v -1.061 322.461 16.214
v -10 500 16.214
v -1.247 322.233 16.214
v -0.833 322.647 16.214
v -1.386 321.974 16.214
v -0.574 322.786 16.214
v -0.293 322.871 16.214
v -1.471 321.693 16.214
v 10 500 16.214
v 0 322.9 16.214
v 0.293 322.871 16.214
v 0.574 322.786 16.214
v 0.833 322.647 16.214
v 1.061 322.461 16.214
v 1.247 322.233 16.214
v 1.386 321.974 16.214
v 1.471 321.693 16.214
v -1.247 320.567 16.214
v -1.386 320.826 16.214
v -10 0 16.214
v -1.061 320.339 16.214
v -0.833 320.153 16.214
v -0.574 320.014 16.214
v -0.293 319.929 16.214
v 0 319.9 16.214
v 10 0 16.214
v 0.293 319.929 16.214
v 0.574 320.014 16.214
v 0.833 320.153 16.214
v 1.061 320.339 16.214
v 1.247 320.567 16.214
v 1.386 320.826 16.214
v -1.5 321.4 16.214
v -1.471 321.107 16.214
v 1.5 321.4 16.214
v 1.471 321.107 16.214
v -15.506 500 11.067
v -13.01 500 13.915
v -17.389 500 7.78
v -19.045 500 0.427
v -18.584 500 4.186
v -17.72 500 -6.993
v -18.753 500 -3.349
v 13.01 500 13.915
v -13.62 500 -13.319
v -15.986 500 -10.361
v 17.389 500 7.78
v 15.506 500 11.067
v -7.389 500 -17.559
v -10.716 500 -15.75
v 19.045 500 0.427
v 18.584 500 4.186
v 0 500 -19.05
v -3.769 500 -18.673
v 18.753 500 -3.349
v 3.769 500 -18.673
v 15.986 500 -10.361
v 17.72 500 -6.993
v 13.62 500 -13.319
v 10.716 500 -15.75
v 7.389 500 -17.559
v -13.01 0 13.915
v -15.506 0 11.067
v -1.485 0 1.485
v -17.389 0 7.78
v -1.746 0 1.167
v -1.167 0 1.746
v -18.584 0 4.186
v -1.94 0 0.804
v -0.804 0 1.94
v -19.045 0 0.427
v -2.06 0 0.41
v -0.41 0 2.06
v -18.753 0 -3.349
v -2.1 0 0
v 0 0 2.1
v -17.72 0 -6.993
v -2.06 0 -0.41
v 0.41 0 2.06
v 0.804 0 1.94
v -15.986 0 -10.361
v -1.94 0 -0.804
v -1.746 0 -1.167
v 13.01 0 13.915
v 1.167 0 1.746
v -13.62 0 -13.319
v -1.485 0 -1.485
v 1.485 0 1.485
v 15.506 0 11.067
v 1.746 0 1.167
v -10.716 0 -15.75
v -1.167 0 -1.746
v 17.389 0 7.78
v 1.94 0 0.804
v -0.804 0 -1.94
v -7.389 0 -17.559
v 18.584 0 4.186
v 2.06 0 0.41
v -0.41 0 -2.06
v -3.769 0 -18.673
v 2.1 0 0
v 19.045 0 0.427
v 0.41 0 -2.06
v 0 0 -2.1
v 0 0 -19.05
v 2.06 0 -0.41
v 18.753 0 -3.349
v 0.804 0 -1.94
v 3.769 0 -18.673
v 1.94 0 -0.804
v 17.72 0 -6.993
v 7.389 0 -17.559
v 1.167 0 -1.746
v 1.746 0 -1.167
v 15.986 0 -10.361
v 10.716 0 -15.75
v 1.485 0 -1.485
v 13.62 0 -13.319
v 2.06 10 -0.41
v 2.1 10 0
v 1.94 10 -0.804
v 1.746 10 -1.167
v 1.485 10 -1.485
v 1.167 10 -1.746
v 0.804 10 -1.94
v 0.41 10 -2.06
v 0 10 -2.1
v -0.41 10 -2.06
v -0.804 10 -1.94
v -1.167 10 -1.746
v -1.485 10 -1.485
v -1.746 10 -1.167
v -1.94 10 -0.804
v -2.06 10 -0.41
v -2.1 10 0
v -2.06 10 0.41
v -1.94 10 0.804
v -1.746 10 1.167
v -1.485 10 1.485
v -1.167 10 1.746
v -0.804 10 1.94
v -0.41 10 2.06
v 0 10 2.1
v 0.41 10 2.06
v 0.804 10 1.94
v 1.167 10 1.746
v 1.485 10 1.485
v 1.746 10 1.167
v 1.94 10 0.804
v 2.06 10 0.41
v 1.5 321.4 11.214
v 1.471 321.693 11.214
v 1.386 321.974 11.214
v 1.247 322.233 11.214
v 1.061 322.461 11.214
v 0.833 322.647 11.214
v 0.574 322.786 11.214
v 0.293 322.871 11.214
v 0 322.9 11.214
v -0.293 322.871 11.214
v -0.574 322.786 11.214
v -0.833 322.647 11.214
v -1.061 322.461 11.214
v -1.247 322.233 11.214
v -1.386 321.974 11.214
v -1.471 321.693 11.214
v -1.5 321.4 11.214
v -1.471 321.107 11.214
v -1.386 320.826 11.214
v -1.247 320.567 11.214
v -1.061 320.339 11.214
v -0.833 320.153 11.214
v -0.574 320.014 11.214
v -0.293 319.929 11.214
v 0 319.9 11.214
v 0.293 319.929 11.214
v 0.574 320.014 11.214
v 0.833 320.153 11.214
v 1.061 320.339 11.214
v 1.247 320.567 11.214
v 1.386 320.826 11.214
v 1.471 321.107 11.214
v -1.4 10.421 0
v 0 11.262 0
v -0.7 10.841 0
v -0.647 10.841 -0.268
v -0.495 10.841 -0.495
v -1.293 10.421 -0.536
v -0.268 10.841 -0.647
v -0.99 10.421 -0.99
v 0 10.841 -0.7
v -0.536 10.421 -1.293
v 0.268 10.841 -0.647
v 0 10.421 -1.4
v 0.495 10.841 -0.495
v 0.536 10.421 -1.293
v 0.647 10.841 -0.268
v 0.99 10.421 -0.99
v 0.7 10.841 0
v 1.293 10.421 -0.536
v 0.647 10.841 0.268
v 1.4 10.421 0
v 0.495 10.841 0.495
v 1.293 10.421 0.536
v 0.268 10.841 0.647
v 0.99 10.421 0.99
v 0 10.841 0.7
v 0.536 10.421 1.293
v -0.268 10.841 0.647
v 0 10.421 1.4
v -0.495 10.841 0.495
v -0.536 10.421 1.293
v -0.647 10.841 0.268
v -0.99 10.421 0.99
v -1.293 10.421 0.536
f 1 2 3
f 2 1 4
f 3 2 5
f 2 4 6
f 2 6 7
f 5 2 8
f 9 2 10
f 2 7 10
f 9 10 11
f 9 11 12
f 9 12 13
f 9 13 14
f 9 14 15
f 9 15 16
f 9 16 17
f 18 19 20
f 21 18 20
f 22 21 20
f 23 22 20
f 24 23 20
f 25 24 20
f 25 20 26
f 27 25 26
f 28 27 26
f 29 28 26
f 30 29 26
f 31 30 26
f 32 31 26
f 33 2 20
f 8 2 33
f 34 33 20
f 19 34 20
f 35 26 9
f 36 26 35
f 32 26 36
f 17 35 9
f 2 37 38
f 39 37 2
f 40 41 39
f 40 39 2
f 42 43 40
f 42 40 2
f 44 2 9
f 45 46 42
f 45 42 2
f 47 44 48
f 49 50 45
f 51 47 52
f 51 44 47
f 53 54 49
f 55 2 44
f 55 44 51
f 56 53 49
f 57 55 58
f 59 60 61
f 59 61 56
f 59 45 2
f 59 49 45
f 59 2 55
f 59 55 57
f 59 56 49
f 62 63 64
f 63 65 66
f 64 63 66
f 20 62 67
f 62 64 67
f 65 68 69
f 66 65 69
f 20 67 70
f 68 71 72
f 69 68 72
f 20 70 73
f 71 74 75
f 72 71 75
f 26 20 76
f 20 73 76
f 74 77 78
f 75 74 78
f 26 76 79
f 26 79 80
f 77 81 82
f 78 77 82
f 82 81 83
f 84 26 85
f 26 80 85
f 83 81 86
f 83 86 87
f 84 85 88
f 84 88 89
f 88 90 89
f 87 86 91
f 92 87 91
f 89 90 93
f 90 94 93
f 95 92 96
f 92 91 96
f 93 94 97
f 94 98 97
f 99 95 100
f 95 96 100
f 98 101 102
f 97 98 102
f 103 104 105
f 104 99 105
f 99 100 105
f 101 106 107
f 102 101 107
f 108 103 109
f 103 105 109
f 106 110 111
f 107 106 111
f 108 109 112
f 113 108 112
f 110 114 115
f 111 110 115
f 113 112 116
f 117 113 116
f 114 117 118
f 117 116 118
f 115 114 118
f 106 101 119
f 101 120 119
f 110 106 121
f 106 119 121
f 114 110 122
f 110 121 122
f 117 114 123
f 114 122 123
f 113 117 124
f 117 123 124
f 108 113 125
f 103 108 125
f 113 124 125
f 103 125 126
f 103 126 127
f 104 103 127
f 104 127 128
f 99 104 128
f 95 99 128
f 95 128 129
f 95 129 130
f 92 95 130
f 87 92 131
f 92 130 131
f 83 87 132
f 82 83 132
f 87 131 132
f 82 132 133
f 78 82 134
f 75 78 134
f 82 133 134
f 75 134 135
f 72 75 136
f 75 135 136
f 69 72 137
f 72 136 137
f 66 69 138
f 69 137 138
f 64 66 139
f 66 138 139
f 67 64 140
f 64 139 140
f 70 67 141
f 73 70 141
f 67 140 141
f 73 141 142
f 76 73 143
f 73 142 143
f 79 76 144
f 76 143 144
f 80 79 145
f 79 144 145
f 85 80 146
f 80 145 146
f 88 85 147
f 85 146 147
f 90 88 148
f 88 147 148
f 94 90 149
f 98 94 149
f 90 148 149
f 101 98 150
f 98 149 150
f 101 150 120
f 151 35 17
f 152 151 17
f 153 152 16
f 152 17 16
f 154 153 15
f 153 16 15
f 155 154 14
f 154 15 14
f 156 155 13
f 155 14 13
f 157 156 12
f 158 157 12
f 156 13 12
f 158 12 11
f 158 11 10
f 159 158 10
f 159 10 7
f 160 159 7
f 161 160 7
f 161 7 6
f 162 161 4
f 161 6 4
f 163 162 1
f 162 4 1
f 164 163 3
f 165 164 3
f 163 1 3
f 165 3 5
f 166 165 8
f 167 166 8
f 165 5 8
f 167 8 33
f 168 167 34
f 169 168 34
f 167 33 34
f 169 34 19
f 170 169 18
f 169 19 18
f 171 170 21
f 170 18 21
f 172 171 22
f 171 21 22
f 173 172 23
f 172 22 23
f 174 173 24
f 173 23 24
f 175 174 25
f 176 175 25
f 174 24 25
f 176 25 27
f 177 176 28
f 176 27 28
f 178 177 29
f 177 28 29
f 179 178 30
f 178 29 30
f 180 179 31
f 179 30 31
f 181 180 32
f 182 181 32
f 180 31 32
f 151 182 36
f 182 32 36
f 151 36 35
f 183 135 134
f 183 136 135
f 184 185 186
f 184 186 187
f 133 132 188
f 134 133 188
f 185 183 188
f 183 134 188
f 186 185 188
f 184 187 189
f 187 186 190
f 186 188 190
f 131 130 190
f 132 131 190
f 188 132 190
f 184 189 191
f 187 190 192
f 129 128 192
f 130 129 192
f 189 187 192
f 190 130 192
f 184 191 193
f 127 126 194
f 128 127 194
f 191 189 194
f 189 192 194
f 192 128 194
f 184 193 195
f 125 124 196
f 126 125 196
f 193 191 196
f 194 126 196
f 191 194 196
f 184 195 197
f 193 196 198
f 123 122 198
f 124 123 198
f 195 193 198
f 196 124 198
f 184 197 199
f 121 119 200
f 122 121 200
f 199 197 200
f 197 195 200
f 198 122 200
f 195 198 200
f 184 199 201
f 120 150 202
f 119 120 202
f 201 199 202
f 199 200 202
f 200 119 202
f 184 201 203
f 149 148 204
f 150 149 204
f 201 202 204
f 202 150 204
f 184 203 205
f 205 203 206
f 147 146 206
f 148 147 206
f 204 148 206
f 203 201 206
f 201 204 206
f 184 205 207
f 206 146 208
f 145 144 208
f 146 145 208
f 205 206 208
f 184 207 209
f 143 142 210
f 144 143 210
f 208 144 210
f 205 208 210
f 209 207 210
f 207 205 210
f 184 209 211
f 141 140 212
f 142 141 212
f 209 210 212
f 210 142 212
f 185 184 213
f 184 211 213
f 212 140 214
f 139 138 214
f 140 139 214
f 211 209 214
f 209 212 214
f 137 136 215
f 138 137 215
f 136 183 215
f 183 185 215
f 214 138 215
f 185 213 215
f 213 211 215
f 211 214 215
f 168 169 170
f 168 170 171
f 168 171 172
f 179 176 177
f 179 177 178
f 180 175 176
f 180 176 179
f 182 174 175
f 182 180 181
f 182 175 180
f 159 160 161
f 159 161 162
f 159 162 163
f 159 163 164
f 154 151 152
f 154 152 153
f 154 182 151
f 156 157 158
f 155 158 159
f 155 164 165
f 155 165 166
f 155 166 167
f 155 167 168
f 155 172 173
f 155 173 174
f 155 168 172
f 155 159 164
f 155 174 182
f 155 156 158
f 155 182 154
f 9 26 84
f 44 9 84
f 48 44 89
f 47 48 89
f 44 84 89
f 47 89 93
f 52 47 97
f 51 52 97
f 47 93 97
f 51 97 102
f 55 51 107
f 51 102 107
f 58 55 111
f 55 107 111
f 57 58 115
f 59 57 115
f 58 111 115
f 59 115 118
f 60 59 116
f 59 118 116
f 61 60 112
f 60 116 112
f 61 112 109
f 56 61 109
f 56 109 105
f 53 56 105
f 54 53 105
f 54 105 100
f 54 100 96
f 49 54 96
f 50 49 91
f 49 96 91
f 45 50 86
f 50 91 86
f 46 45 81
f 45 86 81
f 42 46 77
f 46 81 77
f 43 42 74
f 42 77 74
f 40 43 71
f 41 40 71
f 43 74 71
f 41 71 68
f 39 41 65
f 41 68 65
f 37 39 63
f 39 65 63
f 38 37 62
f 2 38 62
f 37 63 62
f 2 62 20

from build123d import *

# Parameters (mm, degrees)
BOSS_EXTRUDE1_DEPTH       = 500
SKETCH5_R                 = 1.5
CUT_EXTRUDE1_DEPTH        = 5
M5X0_8_TAPPED_HOLE1_D     = 4.2
M5X0_8_TAPPED_HOLE1_DEPTH = 10
M5X0_8_TAPPED_HOLE1_TIP   = 1.2618073


with BuildPart() as part:
    # Sketch3 → Boss-Extrude1 (new body)
    with BuildSketch(Plane(origin=(0, 0, 0), x_dir=(1, 0, 0), z_dir=(0, 1, 0))):
        with BuildLine():
            Line((-10, -16.214268408), (10, -16.214268408))
            ThreePointArc((10, -16.214268408), (0, 19.05), (-10, -16.214268408))
        make_face()
    extrude(amount=BOSS_EXTRUDE1_DEPTH)

    # Sketch5 → Cut-Extrude1 (cut)
    with BuildSketch(Plane.XY.offset(16.214268408)):
        with Locations((0, 321.4)):
            Circle(SKETCH5_R)
    extrude(amount=-CUT_EXTRUDE1_DEPTH, mode=Mode.SUBTRACT)

    # M5x0.8 Tapped Hole1
    with Locations(Plane(origin=(0, 0, 0), x_dir=(-1, 0, 0), z_dir=(0, -1, 0))):
        with Locations((0, 0)):
            Hole(M5X0_8_TAPPED_HOLE1_D / 2, depth=M5X0_8_TAPPED_HOLE1_DEPTH)
            with Locations((0, 0, -(M5X0_8_TAPPED_HOLE1_DEPTH + M5X0_8_TAPPED_HOLE1_TIP / 2))):  # 118° drill point
                Cone(0, M5X0_8_TAPPED_HOLE1_D / 2, M5X0_8_TAPPED_HOLE1_TIP, mode=Mode.SUBTRACT)


solid = part.part
